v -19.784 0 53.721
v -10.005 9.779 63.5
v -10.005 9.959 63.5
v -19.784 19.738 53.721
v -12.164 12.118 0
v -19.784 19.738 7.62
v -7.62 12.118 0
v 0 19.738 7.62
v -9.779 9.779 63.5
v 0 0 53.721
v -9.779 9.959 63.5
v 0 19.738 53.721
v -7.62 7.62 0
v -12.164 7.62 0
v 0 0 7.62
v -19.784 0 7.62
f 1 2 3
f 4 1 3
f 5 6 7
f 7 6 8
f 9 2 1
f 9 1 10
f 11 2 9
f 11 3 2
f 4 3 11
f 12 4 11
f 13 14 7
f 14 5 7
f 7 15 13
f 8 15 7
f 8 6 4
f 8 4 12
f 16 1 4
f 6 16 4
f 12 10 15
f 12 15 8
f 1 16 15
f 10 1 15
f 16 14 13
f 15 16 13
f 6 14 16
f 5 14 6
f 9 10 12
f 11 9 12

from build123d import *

# Parameters (mm, degrees)
F0_W     = 19.783596
F0_H     = 19.73808
F1_DEPTH = 63.5
F2_SIZE  = 9.779
F3_SIZE  = 7.62


with BuildPart() as f1:
    # F0 (on Top) → F1 (new body)
    with BuildSketch(Plane.XY):
        with Locations((-9.891798, 9.86904)):
            Rectangle(F0_W, F0_H)
    extrude(amount=F1_DEPTH)

    # F2
    f2_edges = [f1.edges().sort_by_distance(p)[0] for p in [
        (-9.891798, 0, 63.5),
        (0, 9.86904, 63.5),
        (-9.891798, 19.73808, 63.5),
        (-19.783596, 9.86904, 63.5),
    ]]
    chamfer(f2_edges, length=F2_SIZE)

    # F3
    f3_edges = [f1.edges().sort_by_distance(p)[0] for p in [
        (-9.891798, 0, 0),
        (0, 9.86904, 0),
        (-9.891798, 19.73808, 0),
        (-19.783596, 9.86904, 0),
    ]]
    chamfer(f3_edges, length=F3_SIZE)


solid = f1.part
